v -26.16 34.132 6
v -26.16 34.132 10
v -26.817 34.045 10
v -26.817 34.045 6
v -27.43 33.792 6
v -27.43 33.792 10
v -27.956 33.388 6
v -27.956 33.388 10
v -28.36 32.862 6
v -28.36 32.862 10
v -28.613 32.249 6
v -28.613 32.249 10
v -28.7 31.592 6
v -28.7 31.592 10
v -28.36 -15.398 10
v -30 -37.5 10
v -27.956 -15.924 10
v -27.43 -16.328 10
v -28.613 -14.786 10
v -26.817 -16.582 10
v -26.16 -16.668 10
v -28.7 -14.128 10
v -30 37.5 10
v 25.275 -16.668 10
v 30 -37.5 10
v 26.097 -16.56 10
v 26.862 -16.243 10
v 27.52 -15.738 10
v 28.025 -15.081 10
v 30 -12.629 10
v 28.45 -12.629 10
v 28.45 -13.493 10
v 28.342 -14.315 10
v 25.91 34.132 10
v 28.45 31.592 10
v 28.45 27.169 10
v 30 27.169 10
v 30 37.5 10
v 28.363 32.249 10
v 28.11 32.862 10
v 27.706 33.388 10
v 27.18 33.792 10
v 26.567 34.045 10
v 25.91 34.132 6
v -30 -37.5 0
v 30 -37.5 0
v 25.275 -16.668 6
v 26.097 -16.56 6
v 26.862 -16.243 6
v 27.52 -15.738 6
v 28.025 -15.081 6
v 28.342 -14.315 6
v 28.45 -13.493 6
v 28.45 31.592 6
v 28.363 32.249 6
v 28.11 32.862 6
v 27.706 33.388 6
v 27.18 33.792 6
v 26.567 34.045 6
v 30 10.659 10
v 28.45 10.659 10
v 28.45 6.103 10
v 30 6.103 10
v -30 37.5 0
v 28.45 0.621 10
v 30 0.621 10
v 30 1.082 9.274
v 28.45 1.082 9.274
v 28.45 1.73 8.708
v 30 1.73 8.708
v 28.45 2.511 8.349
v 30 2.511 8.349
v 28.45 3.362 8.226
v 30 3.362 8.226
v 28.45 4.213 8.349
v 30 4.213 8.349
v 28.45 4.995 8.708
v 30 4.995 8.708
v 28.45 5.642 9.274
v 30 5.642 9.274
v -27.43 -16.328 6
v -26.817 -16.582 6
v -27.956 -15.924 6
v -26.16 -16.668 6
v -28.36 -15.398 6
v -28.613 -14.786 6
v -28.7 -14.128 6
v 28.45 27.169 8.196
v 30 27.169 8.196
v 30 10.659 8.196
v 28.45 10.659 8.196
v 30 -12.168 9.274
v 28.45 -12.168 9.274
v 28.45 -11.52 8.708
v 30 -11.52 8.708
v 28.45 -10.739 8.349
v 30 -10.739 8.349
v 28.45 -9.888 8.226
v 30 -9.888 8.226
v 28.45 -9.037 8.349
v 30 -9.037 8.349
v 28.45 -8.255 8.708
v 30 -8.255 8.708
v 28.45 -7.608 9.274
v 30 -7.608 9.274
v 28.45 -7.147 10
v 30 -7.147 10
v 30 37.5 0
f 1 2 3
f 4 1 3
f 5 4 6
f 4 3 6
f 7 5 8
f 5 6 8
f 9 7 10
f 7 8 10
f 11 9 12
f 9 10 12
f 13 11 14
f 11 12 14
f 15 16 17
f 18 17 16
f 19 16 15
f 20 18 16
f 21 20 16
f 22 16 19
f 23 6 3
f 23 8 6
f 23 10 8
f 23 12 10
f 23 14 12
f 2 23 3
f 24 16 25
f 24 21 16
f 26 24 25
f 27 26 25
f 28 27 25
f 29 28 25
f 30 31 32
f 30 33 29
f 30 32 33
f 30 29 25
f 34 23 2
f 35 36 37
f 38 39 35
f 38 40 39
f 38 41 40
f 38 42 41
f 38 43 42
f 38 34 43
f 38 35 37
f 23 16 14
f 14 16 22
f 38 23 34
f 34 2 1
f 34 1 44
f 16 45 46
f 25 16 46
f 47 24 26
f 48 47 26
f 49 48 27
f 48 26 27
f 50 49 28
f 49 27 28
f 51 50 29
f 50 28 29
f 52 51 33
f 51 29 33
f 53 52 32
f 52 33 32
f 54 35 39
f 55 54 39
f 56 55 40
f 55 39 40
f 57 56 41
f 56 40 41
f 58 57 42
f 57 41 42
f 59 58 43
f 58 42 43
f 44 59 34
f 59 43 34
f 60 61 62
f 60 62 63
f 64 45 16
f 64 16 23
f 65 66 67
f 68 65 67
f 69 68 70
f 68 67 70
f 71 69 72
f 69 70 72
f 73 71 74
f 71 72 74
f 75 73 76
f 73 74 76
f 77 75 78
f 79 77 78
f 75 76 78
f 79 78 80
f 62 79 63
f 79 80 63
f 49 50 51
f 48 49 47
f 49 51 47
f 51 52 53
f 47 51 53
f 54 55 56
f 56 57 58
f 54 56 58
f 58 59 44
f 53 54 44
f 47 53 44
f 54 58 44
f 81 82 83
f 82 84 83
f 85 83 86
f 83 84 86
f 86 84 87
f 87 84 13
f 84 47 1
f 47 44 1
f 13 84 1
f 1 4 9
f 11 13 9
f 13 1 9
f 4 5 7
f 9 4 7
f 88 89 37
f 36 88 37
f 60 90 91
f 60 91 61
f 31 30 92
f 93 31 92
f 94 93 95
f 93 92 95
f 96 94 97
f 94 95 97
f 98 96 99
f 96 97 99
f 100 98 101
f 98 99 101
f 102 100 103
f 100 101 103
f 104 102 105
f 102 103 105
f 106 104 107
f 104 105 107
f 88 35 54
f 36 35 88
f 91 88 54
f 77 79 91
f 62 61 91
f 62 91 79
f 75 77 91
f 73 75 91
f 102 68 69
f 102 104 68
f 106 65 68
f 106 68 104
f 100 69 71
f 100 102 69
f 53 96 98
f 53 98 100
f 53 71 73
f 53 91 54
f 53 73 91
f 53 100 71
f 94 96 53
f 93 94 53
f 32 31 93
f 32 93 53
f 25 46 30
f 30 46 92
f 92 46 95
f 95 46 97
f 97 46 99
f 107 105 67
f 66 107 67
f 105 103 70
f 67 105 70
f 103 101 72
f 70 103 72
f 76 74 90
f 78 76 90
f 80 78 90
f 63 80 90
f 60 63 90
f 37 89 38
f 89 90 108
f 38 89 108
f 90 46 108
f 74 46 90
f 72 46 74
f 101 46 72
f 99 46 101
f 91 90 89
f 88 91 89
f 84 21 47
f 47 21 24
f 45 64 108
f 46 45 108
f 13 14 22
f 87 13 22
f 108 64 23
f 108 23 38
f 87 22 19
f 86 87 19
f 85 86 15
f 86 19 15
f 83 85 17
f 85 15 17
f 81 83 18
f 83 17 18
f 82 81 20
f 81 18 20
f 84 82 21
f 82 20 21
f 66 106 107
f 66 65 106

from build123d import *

# Parameters (mm, degrees)
SKETCH_W        = 60
SKETCH_H        = 75
PAD_DEPTH       = 10
POCKET_DEPTH    = 4
SKETCH002_R     = 3.003779
SKETCH002_W     = 16.509998
SKETCH002_H     = 13.460002
POCKET001_DEPTH = 5


with BuildPart() as part:
    # Sketch → Pad (new body)
    with BuildSketch(Plane.XY):
        Rectangle(SKETCH_W, SKETCH_H)
    extrude(amount=PAD_DEPTH)

    # Sketch001 (on Face6 of Pad) → Pocket (cut)
    with BuildSketch(Plane.XY.offset(10)):
        with BuildLine():
            Line((-26.160018, 34.131806), (25.909982, 34.131806))
            ThreePointArc((28.449982, 31.591806), (27.706037, 33.38786), (25.909982, 34.131806))
            Line((28.449982, 31.591806), (28.449982, -13.493194))
            ThreePointArc((25.274982, -16.668194), (27.520043, -15.738255), (28.449982, -13.493194))
            Line((-26.160018, -16.668194), (25.274982, -16.668194))
            ThreePointArc((-28.700018, -14.128194), (-27.956072, -15.924248), (-26.160018, -16.668194))
            Line((-28.700018, 31.591806), (-28.700018, -14.128194))
            ThreePointArc((-26.160018, 34.131806), (-27.956078, 33.387866), (-28.700018, 31.591806))
        make_face()
    extrude(amount=-POCKET_DEPTH, mode=Mode.SUBTRACT)

    # Sketch002 (on Face3 of Pocket) → Pocket001 (cut)
    with BuildSketch(Plane.YZ.offset(30)):
        with Locations((3.362204, 11.229303)):
            Circle(SKETCH002_R)
        with Locations((-9.887796, 11.229303)):
            Circle(SKETCH002_R)
        with Locations((18.913807, 14.92554)):
            Rectangle(SKETCH002_W, SKETCH002_H)
    extrude(amount=-POCKET001_DEPTH, mode=Mode.SUBTRACT)


solid = part.part
